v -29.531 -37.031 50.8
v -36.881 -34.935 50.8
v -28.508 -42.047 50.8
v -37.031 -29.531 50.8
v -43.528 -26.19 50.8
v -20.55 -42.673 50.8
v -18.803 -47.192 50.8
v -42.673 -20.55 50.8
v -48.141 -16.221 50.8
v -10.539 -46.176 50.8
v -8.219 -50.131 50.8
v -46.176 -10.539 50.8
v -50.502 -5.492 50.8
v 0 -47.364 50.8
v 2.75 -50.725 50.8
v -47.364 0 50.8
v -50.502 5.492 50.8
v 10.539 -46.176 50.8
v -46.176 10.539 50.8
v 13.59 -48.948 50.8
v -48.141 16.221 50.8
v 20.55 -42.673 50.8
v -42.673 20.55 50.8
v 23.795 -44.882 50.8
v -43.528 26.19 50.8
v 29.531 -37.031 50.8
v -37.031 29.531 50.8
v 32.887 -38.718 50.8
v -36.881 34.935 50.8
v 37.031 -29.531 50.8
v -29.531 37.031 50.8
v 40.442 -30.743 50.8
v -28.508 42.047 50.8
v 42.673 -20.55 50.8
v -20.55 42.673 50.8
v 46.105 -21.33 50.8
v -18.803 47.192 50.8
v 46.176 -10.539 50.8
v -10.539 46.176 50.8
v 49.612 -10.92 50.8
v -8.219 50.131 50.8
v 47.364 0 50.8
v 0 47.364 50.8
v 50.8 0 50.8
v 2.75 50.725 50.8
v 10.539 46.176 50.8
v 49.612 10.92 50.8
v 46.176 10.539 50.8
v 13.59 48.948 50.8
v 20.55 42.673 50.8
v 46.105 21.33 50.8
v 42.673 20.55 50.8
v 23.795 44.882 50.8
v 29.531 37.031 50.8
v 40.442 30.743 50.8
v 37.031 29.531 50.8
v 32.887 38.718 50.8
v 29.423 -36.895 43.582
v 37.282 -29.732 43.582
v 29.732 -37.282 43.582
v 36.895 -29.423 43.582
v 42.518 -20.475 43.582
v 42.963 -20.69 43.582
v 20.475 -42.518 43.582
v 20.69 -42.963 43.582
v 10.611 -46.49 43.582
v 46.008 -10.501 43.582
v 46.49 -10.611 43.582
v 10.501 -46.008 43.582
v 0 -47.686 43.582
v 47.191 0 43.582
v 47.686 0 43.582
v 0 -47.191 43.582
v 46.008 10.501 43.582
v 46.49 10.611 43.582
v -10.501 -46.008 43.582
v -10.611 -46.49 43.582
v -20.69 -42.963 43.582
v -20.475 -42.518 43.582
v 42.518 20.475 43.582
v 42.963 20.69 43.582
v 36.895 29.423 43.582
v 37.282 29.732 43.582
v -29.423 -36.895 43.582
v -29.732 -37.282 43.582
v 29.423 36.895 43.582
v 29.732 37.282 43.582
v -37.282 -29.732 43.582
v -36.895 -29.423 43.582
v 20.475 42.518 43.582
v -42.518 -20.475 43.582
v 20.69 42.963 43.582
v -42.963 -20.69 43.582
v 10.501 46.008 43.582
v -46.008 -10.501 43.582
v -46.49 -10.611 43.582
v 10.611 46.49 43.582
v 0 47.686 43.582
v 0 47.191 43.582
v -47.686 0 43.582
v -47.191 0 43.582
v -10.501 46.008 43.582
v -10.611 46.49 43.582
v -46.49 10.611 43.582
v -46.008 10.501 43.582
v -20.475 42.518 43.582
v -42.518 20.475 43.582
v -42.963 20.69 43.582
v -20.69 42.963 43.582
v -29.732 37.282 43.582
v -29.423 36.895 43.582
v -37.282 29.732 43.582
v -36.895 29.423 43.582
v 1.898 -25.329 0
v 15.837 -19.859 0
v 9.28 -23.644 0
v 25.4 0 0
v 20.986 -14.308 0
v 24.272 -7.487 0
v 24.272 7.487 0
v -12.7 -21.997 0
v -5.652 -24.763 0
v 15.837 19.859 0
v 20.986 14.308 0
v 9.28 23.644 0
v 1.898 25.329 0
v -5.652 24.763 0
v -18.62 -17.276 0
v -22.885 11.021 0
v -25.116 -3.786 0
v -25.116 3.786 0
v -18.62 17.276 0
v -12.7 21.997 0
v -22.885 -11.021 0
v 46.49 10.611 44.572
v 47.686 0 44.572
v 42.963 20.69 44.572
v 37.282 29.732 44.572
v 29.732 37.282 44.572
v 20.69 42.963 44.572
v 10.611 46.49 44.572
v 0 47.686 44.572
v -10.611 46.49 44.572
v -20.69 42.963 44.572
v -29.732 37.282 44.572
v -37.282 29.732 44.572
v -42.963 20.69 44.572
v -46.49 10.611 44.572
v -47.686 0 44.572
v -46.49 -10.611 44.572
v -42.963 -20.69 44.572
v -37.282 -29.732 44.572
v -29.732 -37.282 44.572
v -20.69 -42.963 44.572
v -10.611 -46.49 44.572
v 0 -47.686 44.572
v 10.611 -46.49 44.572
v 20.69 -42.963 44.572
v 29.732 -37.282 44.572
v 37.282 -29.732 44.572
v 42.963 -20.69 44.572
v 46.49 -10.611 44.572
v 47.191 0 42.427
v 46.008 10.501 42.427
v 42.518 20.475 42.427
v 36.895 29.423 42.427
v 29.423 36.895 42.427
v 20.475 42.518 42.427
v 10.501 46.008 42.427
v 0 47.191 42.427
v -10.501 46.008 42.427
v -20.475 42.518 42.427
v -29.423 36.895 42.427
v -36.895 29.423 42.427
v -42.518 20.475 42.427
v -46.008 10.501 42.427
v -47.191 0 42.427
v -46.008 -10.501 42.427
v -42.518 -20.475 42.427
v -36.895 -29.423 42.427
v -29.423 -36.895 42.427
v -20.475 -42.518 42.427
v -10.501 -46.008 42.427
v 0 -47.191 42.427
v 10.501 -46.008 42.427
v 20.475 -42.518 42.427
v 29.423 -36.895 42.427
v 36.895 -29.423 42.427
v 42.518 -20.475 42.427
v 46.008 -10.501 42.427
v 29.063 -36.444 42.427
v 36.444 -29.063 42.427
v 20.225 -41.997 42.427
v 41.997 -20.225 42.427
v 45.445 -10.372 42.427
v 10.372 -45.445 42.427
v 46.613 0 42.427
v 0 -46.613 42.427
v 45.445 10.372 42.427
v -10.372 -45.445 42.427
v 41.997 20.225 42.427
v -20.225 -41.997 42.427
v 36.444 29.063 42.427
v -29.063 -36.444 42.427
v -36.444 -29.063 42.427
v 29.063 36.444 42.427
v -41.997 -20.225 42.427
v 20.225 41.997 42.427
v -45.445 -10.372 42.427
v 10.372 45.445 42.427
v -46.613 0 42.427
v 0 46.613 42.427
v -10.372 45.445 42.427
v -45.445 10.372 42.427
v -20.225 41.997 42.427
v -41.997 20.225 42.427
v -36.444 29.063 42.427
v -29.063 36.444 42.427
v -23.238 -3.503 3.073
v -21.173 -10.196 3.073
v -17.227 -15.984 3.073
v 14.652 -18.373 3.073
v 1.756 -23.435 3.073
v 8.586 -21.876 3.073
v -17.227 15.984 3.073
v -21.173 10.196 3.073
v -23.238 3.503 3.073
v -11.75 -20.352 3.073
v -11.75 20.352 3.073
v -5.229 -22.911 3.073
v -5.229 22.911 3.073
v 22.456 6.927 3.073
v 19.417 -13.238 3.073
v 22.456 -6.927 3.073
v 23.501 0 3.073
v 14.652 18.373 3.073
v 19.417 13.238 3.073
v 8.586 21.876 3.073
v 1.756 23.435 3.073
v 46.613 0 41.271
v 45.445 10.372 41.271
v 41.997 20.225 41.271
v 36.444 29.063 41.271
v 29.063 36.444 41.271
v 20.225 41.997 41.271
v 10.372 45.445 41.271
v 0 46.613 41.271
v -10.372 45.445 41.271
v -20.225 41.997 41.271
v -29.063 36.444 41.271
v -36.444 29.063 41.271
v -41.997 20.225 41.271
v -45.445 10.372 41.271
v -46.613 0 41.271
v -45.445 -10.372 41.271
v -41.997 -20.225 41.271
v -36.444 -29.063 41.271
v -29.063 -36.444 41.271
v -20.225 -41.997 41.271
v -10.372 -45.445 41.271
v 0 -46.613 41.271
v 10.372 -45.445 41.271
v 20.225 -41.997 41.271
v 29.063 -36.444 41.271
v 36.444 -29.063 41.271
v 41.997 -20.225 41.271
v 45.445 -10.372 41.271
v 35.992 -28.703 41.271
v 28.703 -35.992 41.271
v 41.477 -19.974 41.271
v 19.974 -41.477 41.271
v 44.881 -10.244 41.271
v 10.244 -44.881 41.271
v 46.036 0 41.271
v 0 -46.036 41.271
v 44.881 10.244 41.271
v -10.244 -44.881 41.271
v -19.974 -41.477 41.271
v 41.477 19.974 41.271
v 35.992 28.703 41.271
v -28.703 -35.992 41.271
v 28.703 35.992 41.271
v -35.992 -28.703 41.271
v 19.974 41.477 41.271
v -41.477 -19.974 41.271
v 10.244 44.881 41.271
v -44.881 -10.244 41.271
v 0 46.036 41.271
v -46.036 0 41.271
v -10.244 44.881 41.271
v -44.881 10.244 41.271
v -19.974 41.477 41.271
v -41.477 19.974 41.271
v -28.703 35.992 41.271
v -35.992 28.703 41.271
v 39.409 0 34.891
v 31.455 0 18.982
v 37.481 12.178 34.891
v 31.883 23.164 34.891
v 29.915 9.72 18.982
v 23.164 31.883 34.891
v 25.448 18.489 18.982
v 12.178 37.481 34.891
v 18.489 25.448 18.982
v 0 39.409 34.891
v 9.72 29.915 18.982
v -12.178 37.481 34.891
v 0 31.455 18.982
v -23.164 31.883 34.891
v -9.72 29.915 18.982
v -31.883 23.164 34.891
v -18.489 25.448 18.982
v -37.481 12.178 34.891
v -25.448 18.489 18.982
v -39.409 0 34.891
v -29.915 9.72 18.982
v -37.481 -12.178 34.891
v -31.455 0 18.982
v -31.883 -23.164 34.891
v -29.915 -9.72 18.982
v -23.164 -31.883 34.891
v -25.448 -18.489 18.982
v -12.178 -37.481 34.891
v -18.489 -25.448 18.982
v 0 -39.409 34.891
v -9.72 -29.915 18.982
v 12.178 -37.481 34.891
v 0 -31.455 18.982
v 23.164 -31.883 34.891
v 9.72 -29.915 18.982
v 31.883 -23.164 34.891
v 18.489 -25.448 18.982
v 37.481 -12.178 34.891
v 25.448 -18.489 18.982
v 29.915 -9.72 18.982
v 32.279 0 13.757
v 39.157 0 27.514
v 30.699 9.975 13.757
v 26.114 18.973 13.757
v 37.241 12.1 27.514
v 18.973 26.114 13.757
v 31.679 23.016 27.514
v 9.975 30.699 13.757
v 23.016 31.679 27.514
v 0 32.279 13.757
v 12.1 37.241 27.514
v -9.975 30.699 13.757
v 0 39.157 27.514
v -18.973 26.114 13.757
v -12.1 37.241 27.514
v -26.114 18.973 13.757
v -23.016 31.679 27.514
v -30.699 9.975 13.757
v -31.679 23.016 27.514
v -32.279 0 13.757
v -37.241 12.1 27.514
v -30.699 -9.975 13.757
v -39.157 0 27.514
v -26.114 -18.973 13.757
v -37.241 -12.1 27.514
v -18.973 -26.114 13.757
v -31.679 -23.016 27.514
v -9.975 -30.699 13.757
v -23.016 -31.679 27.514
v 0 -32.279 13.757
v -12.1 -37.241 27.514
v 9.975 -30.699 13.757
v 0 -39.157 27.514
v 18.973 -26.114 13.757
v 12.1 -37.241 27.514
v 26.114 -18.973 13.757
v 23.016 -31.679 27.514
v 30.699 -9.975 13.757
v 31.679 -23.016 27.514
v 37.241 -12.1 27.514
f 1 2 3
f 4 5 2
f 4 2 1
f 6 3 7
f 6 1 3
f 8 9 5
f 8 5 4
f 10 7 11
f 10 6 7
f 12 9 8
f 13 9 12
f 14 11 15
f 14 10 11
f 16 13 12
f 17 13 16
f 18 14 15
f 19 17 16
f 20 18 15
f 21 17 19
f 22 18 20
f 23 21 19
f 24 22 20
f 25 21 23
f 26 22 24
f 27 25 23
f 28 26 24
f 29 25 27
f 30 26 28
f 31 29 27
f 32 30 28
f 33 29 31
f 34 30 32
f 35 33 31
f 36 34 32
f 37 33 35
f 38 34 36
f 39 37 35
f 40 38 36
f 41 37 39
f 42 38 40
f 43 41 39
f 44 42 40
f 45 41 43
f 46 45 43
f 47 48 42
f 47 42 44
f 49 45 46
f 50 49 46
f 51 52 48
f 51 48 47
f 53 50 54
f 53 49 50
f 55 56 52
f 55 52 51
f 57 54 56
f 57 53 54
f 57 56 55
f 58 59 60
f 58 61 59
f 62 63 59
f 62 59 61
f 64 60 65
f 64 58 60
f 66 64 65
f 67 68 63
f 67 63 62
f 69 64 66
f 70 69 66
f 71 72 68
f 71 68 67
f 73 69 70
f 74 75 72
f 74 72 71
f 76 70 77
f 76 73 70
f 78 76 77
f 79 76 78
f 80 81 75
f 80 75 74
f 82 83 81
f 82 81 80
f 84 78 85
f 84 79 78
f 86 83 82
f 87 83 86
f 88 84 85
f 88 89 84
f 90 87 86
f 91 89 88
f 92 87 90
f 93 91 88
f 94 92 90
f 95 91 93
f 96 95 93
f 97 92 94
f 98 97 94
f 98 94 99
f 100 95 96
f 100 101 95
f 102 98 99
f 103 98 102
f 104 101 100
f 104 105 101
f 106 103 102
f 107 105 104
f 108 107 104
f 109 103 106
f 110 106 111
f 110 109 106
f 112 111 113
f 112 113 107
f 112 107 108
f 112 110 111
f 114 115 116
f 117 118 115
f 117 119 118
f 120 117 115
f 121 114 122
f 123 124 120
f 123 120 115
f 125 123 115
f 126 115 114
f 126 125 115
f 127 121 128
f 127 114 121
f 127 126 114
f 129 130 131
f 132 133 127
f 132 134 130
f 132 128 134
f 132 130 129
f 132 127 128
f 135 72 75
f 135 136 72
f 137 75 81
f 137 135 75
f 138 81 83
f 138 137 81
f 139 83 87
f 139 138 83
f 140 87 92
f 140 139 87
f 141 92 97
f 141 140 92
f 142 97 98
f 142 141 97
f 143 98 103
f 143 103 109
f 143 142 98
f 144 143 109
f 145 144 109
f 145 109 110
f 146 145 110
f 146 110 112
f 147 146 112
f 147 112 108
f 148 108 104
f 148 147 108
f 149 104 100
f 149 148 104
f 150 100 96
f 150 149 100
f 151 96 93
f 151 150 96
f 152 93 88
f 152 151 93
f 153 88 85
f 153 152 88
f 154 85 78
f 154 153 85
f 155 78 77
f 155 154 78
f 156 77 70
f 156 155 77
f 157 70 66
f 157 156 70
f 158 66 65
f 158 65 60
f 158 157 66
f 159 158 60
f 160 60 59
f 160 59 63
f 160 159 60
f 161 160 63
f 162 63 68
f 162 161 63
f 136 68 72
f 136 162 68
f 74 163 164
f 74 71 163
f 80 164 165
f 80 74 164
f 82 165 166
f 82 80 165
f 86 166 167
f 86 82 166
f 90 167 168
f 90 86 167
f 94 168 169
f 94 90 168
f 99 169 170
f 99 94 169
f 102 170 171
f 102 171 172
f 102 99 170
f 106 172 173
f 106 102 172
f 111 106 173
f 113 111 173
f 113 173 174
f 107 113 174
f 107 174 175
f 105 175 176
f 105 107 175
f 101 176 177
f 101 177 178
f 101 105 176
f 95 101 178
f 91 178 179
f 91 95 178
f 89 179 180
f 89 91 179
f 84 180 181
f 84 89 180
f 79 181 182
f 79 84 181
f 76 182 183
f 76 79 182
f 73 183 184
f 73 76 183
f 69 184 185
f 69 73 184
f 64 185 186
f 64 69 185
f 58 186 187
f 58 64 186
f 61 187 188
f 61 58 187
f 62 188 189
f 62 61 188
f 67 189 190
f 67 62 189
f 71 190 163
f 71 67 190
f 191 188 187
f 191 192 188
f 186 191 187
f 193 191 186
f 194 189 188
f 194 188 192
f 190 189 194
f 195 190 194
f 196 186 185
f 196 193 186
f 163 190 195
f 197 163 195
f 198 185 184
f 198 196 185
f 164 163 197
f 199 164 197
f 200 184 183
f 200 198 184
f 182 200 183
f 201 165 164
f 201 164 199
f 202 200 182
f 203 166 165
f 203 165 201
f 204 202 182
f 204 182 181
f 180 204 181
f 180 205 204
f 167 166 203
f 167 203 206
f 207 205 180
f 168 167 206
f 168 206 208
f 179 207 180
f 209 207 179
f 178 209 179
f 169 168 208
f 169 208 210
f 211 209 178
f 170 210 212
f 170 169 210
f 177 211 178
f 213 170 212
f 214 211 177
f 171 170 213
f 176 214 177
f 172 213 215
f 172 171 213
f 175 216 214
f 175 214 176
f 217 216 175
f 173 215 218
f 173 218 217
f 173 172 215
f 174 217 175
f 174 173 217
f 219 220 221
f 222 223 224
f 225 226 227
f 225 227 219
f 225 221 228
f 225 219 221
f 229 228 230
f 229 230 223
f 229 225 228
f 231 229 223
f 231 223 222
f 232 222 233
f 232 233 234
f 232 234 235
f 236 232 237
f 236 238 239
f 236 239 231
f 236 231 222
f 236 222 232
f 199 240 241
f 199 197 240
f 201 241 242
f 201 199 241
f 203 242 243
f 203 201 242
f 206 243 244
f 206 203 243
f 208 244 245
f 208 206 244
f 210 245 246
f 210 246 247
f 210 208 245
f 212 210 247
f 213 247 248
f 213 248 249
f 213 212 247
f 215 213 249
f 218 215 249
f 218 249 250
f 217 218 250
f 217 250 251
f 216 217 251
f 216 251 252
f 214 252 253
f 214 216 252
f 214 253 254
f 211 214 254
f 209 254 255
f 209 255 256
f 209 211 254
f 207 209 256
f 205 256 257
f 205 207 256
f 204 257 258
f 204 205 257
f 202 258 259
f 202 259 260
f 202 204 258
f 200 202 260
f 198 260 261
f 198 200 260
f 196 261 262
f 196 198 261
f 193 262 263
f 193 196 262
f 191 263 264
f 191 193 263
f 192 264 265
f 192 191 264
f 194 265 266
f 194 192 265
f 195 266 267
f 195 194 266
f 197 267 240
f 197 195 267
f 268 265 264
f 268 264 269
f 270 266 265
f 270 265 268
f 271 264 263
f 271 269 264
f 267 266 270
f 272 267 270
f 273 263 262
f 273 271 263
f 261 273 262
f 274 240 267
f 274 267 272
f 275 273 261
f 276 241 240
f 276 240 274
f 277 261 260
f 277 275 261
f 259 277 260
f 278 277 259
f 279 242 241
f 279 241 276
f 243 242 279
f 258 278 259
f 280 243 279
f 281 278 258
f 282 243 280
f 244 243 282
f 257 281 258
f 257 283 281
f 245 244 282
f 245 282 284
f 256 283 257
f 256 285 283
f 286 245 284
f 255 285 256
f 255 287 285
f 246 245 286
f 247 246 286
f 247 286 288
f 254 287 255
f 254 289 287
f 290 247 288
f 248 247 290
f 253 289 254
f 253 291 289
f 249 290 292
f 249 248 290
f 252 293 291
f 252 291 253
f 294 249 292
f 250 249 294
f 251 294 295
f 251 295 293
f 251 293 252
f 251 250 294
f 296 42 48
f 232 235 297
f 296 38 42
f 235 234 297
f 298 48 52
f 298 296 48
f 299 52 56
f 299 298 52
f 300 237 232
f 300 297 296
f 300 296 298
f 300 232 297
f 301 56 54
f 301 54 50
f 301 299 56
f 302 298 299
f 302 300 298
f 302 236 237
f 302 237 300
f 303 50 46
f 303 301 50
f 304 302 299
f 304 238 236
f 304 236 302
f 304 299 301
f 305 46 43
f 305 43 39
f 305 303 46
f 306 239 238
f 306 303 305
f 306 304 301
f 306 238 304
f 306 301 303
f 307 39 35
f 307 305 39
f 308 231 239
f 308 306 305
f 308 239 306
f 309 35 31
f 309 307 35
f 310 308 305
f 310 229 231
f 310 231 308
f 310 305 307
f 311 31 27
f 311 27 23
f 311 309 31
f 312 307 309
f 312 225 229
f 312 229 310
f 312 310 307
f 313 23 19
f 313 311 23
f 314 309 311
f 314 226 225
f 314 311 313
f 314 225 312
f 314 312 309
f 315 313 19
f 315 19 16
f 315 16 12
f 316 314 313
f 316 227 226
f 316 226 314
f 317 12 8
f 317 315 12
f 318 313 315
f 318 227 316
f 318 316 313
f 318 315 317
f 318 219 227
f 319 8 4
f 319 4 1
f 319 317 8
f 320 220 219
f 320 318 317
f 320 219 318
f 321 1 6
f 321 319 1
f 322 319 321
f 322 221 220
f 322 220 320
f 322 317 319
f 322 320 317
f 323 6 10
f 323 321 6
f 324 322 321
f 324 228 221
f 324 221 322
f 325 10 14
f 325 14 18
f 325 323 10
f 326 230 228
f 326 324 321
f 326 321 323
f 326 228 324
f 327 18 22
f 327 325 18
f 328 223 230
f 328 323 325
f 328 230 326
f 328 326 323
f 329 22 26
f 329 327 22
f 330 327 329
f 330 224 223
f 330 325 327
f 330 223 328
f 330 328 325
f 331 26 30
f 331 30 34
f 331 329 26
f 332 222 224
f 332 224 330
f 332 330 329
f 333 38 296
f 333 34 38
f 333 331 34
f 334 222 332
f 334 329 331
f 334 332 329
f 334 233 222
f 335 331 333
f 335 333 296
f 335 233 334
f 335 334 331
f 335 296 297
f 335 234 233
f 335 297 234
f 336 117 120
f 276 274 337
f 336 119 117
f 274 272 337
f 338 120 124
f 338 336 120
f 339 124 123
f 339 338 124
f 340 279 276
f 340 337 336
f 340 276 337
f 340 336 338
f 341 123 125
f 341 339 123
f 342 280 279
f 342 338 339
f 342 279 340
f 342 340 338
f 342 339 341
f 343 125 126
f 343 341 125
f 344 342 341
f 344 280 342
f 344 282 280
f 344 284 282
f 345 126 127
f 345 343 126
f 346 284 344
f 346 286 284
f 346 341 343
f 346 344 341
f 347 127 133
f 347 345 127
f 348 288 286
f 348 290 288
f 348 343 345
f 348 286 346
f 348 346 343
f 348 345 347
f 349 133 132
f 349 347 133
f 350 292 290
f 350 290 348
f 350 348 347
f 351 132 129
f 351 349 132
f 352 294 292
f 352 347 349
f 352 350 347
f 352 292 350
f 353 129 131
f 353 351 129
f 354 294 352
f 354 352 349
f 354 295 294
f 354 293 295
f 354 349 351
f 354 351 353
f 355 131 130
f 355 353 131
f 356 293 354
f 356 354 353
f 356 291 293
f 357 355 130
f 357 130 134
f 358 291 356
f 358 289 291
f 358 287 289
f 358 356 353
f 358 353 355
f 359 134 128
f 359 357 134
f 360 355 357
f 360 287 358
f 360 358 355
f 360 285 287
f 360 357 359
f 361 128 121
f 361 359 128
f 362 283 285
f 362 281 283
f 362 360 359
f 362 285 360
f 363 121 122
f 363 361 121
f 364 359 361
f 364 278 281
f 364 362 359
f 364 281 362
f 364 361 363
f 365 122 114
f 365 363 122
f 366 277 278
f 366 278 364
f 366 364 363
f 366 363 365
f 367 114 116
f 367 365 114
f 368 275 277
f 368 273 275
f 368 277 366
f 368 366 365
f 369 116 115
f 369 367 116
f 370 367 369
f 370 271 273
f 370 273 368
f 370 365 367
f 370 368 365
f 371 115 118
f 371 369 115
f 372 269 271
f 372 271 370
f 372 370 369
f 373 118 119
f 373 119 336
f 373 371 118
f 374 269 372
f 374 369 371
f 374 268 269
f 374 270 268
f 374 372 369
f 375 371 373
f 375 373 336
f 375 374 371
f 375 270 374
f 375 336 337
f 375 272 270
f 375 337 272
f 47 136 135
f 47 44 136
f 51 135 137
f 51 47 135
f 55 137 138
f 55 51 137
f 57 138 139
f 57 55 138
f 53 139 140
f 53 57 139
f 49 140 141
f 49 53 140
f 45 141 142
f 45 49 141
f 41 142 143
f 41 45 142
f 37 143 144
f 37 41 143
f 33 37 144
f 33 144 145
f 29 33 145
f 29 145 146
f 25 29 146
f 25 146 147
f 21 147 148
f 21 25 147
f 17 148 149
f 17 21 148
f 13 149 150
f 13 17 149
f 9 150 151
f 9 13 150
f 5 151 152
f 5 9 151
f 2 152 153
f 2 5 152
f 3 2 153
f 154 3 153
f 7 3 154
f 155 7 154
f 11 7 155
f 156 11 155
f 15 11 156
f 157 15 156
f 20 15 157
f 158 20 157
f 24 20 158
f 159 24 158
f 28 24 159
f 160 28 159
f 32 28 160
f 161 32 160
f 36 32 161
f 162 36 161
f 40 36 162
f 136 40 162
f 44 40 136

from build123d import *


with BuildPart() as f1:
    # F0 (on Front) → F1 (revolve)
    with BuildSketch(Plane.XZ):
        Polygon((0, 3.0734), (0, 0), (25.4, 0), (46.035527, 41.271053), (46.613301, 42.426601), (47.191074, 43.582149), (47.685844, 44.571688), (50.8, 50.8), (47.363834, 50.8), (23.500534, 3.0734), align=None)
        Polygon((47.191074, 43.582149), (46.613301, 42.426601), (47.191074, 42.426601), align=None)
        Polygon((47.685844, 44.571688), (47.191074, 43.582149), (47.685844, 43.582149), align=None)
        Polygon((46.613301, 42.426601), (46.035527, 41.271053), (46.613301, 41.271053), align=None)
    revolve(axis=Axis((0, 0, 25.4), (0, 0, 1)))


solid = f1.part
